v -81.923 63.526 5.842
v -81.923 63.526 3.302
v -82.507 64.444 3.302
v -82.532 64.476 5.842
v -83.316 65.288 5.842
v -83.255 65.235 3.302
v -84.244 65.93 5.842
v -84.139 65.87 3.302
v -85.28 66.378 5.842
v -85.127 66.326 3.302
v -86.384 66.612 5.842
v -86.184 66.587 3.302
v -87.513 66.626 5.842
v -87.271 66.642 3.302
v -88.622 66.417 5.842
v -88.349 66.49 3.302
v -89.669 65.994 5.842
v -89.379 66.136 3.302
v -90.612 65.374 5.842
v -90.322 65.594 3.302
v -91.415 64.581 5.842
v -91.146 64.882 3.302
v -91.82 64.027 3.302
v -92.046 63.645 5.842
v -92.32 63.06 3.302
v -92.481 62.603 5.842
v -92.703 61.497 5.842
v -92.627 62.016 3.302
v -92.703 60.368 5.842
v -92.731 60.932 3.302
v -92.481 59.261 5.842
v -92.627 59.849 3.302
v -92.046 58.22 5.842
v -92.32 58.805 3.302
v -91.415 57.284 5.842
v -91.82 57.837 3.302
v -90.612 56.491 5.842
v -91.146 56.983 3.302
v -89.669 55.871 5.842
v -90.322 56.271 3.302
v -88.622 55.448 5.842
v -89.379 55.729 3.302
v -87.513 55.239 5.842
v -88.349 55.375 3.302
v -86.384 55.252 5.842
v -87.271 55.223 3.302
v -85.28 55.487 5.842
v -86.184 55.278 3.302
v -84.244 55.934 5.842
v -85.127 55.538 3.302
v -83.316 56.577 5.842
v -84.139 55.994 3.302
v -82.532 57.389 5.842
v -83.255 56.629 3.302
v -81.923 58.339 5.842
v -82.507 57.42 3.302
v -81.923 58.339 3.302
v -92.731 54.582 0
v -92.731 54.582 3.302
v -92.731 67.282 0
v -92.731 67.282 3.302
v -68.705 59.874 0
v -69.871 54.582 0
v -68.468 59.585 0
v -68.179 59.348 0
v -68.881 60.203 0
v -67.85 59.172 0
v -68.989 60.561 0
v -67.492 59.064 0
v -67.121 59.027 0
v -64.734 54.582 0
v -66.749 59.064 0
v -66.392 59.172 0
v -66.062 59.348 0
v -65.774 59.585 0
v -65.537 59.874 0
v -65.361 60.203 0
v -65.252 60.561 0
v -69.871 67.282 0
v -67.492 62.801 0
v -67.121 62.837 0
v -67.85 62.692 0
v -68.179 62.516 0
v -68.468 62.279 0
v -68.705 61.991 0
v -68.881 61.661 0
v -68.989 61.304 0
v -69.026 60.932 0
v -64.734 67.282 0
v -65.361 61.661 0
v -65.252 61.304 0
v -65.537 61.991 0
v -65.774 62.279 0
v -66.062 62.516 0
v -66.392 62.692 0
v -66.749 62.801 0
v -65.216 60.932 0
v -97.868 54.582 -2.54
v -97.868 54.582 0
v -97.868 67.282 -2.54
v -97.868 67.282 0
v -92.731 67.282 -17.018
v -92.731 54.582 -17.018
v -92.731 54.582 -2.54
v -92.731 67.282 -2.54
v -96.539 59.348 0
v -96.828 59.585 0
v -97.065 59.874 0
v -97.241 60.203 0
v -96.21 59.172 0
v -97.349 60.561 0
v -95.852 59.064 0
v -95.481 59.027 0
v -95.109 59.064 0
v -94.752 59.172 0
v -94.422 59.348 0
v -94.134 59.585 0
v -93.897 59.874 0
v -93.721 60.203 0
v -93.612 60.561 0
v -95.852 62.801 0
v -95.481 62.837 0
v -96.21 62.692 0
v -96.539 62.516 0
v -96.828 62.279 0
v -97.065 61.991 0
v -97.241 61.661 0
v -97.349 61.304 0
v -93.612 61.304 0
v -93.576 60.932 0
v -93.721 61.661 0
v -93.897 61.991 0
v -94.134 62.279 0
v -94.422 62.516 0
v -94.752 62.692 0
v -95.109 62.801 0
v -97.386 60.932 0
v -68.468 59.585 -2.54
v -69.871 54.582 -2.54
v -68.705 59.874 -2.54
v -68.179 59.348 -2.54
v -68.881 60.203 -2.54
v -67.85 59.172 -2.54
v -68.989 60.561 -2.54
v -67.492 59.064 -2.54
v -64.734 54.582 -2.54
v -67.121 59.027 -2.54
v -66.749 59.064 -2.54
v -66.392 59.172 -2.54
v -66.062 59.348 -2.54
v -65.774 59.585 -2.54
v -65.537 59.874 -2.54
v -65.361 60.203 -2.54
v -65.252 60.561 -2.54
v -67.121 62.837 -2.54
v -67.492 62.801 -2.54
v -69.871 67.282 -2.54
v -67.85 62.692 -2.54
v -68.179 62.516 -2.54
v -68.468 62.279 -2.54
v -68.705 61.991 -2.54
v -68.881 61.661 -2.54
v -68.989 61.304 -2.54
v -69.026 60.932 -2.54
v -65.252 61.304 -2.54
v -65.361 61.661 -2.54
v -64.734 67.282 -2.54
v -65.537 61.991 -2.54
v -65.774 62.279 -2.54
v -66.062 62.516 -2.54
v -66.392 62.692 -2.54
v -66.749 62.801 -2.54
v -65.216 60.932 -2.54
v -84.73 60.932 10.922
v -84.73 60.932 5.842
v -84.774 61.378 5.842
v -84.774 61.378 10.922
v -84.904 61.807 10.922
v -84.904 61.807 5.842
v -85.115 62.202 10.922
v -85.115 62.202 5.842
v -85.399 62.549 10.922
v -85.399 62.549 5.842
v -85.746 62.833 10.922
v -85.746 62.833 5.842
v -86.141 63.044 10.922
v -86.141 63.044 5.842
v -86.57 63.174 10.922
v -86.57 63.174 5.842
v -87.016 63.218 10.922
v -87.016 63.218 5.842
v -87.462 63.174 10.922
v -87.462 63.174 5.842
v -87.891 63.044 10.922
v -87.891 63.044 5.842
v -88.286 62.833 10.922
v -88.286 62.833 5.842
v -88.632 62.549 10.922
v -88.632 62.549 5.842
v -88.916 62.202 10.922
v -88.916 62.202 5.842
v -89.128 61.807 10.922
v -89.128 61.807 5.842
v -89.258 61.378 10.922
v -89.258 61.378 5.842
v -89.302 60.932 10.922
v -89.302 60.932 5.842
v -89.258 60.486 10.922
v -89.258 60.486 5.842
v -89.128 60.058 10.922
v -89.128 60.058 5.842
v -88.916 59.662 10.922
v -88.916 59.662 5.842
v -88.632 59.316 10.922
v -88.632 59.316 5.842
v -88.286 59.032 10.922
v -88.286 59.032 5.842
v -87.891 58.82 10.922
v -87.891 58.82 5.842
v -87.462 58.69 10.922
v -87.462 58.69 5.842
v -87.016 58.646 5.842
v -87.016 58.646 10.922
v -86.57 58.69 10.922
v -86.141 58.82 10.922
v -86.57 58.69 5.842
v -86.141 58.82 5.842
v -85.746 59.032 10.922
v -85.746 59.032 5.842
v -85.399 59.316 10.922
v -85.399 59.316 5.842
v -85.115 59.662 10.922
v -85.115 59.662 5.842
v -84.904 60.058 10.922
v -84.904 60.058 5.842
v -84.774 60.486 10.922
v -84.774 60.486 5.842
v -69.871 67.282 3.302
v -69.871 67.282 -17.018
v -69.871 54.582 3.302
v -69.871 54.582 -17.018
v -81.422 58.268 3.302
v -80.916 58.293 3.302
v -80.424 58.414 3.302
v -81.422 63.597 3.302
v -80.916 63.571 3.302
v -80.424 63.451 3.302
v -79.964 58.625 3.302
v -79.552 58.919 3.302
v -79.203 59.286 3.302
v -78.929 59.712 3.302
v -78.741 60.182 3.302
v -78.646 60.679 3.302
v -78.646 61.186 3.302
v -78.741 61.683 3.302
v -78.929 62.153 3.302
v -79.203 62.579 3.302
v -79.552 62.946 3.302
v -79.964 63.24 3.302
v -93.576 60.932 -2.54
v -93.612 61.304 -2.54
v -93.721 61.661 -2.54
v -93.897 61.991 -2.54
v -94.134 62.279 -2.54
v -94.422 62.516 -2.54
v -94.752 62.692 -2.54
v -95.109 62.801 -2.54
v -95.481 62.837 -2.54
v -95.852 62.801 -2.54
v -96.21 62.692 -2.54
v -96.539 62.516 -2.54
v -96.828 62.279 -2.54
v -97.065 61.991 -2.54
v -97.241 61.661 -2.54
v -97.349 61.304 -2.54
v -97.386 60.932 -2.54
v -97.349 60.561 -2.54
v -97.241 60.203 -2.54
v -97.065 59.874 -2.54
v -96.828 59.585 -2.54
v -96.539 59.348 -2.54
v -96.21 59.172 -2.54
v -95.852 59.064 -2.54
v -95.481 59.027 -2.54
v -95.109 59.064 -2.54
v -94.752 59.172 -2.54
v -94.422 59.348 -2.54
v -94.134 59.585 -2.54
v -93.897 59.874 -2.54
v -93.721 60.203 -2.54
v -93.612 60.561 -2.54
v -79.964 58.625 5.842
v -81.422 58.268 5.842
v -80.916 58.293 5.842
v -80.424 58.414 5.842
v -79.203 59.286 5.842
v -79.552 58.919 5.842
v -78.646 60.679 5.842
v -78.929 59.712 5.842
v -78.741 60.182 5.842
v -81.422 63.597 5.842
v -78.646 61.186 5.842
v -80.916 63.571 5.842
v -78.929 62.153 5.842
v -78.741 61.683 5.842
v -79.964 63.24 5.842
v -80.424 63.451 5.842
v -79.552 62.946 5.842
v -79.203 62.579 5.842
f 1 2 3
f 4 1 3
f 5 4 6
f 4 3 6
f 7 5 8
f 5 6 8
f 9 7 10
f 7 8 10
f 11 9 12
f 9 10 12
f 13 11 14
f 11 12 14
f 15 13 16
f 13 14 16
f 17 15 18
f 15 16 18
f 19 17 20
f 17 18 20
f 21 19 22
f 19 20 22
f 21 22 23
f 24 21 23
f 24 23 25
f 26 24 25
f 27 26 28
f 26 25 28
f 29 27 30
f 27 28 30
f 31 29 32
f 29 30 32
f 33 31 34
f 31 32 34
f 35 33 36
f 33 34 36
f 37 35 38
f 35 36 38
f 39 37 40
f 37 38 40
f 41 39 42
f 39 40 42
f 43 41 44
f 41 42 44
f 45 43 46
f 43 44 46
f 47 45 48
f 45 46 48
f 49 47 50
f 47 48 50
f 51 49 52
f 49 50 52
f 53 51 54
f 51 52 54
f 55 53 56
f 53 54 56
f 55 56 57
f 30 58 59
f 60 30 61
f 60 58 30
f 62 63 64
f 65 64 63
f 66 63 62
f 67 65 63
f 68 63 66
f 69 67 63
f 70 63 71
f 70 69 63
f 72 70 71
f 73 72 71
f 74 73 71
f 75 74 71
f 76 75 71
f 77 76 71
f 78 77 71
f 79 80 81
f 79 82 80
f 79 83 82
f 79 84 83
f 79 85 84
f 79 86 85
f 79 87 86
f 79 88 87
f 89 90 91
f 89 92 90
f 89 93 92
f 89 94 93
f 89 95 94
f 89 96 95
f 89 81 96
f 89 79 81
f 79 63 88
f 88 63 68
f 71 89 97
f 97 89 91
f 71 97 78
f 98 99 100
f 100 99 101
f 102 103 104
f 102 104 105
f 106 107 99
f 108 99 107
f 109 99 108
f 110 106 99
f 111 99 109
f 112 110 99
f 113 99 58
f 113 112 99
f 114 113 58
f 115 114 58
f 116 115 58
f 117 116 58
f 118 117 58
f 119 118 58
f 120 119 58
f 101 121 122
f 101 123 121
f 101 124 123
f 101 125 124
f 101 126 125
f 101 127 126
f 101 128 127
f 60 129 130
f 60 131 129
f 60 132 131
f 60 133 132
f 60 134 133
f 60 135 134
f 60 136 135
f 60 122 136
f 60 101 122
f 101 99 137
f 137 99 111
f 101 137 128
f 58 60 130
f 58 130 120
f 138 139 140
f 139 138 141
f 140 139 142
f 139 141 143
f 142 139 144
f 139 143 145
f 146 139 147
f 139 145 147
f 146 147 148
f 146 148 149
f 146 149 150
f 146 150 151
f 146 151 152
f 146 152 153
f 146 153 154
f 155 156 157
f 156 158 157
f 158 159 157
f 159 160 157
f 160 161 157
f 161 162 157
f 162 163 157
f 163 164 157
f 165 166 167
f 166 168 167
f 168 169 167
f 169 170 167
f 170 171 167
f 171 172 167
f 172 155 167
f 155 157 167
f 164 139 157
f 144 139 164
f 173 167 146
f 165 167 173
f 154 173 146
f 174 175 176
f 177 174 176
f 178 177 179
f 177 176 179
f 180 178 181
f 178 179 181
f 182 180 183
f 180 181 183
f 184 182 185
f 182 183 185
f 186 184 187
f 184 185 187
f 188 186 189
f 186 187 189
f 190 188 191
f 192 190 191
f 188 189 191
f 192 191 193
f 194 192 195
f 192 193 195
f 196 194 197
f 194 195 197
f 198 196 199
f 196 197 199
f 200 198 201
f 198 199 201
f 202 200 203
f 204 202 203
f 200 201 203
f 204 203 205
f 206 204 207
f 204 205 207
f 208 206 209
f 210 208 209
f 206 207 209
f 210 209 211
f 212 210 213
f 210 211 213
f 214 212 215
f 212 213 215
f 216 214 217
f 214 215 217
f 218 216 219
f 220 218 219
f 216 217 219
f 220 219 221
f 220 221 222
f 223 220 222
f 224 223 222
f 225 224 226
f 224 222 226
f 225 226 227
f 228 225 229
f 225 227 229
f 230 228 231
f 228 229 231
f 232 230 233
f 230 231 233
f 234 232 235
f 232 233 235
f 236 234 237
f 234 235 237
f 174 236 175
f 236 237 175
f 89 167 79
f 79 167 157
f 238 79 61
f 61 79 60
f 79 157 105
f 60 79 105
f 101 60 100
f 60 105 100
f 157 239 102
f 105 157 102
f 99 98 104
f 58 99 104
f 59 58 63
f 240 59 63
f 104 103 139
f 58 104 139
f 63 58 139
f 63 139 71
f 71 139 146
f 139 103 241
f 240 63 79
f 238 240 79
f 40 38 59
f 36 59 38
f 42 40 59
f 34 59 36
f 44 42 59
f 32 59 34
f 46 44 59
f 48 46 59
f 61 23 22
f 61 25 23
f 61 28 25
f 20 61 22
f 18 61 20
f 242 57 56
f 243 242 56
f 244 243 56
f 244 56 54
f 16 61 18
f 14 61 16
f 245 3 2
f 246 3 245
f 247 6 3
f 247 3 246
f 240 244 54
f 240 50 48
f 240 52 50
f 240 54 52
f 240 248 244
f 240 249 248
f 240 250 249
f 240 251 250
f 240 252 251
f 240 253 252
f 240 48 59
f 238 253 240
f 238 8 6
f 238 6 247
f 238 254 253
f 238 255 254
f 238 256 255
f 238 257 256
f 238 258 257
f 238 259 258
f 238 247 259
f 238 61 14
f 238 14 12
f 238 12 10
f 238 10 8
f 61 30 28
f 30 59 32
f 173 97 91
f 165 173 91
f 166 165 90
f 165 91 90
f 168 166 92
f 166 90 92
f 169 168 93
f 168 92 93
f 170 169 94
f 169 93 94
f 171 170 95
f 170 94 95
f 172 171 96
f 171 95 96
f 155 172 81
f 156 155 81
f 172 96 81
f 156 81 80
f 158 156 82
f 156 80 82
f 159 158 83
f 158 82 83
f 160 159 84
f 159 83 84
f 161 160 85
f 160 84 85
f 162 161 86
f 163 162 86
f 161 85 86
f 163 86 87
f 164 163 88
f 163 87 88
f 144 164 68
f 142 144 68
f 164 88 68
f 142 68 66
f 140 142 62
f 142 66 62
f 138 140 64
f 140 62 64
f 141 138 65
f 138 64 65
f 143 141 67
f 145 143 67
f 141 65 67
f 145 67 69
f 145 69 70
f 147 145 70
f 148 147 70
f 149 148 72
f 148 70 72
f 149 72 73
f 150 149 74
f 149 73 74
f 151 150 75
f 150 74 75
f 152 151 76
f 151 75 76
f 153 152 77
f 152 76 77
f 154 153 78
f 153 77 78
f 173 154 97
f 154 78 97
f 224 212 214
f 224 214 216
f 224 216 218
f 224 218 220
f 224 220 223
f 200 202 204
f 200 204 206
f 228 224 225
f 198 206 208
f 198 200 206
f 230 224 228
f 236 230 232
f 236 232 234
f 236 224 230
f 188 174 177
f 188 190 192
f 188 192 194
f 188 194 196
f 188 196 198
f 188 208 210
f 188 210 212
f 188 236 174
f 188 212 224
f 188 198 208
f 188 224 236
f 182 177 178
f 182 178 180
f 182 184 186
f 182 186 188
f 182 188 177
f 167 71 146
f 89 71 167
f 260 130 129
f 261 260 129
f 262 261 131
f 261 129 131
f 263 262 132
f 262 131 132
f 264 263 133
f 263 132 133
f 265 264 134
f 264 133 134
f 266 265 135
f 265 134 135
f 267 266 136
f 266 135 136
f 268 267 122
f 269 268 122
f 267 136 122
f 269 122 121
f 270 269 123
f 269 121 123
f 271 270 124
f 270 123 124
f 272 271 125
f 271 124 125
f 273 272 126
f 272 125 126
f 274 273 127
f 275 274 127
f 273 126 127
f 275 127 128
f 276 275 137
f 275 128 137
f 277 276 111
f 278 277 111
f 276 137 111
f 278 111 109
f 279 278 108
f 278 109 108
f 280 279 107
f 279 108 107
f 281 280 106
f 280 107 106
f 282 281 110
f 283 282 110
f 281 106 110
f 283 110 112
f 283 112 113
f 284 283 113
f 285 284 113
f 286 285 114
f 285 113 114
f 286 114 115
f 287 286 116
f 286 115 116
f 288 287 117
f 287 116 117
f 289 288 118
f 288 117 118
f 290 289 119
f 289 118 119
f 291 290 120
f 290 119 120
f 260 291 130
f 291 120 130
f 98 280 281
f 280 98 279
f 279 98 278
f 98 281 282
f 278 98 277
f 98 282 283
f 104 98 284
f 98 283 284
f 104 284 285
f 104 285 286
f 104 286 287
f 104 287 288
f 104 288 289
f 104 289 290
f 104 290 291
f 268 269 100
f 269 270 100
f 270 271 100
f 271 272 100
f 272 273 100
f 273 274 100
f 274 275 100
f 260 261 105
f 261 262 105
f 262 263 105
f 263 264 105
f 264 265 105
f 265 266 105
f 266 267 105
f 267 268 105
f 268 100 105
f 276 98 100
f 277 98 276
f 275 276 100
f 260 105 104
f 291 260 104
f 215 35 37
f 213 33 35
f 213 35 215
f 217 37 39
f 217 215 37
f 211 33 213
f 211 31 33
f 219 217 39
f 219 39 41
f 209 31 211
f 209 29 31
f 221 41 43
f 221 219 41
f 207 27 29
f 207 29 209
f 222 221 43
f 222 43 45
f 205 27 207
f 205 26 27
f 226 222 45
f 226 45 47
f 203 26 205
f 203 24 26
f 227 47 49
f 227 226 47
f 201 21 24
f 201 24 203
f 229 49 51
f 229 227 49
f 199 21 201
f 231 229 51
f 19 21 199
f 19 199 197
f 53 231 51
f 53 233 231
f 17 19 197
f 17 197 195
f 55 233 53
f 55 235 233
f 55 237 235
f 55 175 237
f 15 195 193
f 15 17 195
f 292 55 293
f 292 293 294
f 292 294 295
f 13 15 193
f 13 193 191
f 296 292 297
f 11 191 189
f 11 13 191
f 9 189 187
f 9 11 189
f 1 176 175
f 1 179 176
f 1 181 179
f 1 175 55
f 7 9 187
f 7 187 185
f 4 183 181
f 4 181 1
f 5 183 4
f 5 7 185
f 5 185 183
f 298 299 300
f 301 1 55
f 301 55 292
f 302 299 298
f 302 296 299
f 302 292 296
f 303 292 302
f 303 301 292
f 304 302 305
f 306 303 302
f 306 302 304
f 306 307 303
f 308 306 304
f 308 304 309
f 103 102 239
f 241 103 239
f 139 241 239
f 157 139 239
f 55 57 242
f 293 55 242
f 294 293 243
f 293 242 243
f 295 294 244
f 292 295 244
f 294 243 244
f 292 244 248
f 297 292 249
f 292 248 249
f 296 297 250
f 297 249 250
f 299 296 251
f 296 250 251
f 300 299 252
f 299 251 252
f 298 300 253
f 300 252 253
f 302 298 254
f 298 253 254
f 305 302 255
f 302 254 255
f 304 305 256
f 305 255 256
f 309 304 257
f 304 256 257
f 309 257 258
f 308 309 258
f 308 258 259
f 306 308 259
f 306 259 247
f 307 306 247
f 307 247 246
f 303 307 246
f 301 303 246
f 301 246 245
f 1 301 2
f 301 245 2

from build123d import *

# Parameters (mm, degrees)
BOSS_EXTRUDE1_DEPTH      = 3.302
BOSS_EXTRUDE1_DEPTH_BACK = 17.018
SKETCH2_W                = 22.86
SKETCH2_H                = 12.7
SKETCH2_5_W              = 5.136925293
SKETCH2_5_H              = 12.7
SKETCH2_5_R              = 1.905
BOSS_EXTRUDE2_DEPTH      = 2.54
BOSS_EXTRUDE3_DEPTH      = 2.54
SKETCH4_R                = 2.286
BOSS_EXTRUDE4_DEPTH      = 5.08


with BuildPart() as part:
    # Sketch2 → Boss-Extrude1 (new, two sides: drawn at the far end of the back side and taken through both)
    with BuildSketch(Plane.XY.offset(-BOSS_EXTRUDE1_DEPTH_BACK)):
        with Locations((-81.300738581, 60.932338755)):
            Rectangle(SKETCH2_W, SKETCH2_H)
    extrude(amount=BOSS_EXTRUDE1_DEPTH + BOSS_EXTRUDE1_DEPTH_BACK)

    # Sketch2<5> → Boss-Extrude2 (add)
    # profile 1 of 2: a face of its own
    with BuildSketch(Plane.XY):
        with Locations((-95.299201228, 60.932338755)):
            Rectangle(SKETCH2_5_W, SKETCH2_5_H)
        with Locations((-95.480738581, 60.932338755)):
            Circle(SKETCH2_5_R, mode=Mode.SUBTRACT)
    # profile 2 of 2: a face of its own
    with BuildSketch(Plane.XY):
        with Locations((-67.302275935, 60.932338755)):
            Rectangle(SKETCH2_5_W, SKETCH2_5_H)
        with Locations((-67.120738581, 60.932338755)):
            Circle(SKETCH2_5_R, mode=Mode.SUBTRACT)
    extrude(amount=-BOSS_EXTRUDE2_DEPTH)

    # Sketch3 → Boss-Extrude3 (add)
    with BuildSketch(Plane.XY.offset(3.302)):
        with BuildLine():
            ThreePointArc((-81.923038581, 63.525721047), (-92.730738581, 60.932338755), (-81.923038581, 58.338956464))
            ThreePointArc((-81.923038581, 58.338956464), (-78.633738581, 60.932338755), (-81.923038581, 63.525721047))
        make_face()
    extrude(amount=BOSS_EXTRUDE3_DEPTH)

    # Sketch4 → Boss-Extrude4 (add)
    with BuildSketch(Plane.XY.offset(5.842)):
        with Locations((-87.015738581, 60.932338755)):
            Circle(SKETCH4_R)
    extrude(amount=BOSS_EXTRUDE4_DEPTH)


solid = part.part
